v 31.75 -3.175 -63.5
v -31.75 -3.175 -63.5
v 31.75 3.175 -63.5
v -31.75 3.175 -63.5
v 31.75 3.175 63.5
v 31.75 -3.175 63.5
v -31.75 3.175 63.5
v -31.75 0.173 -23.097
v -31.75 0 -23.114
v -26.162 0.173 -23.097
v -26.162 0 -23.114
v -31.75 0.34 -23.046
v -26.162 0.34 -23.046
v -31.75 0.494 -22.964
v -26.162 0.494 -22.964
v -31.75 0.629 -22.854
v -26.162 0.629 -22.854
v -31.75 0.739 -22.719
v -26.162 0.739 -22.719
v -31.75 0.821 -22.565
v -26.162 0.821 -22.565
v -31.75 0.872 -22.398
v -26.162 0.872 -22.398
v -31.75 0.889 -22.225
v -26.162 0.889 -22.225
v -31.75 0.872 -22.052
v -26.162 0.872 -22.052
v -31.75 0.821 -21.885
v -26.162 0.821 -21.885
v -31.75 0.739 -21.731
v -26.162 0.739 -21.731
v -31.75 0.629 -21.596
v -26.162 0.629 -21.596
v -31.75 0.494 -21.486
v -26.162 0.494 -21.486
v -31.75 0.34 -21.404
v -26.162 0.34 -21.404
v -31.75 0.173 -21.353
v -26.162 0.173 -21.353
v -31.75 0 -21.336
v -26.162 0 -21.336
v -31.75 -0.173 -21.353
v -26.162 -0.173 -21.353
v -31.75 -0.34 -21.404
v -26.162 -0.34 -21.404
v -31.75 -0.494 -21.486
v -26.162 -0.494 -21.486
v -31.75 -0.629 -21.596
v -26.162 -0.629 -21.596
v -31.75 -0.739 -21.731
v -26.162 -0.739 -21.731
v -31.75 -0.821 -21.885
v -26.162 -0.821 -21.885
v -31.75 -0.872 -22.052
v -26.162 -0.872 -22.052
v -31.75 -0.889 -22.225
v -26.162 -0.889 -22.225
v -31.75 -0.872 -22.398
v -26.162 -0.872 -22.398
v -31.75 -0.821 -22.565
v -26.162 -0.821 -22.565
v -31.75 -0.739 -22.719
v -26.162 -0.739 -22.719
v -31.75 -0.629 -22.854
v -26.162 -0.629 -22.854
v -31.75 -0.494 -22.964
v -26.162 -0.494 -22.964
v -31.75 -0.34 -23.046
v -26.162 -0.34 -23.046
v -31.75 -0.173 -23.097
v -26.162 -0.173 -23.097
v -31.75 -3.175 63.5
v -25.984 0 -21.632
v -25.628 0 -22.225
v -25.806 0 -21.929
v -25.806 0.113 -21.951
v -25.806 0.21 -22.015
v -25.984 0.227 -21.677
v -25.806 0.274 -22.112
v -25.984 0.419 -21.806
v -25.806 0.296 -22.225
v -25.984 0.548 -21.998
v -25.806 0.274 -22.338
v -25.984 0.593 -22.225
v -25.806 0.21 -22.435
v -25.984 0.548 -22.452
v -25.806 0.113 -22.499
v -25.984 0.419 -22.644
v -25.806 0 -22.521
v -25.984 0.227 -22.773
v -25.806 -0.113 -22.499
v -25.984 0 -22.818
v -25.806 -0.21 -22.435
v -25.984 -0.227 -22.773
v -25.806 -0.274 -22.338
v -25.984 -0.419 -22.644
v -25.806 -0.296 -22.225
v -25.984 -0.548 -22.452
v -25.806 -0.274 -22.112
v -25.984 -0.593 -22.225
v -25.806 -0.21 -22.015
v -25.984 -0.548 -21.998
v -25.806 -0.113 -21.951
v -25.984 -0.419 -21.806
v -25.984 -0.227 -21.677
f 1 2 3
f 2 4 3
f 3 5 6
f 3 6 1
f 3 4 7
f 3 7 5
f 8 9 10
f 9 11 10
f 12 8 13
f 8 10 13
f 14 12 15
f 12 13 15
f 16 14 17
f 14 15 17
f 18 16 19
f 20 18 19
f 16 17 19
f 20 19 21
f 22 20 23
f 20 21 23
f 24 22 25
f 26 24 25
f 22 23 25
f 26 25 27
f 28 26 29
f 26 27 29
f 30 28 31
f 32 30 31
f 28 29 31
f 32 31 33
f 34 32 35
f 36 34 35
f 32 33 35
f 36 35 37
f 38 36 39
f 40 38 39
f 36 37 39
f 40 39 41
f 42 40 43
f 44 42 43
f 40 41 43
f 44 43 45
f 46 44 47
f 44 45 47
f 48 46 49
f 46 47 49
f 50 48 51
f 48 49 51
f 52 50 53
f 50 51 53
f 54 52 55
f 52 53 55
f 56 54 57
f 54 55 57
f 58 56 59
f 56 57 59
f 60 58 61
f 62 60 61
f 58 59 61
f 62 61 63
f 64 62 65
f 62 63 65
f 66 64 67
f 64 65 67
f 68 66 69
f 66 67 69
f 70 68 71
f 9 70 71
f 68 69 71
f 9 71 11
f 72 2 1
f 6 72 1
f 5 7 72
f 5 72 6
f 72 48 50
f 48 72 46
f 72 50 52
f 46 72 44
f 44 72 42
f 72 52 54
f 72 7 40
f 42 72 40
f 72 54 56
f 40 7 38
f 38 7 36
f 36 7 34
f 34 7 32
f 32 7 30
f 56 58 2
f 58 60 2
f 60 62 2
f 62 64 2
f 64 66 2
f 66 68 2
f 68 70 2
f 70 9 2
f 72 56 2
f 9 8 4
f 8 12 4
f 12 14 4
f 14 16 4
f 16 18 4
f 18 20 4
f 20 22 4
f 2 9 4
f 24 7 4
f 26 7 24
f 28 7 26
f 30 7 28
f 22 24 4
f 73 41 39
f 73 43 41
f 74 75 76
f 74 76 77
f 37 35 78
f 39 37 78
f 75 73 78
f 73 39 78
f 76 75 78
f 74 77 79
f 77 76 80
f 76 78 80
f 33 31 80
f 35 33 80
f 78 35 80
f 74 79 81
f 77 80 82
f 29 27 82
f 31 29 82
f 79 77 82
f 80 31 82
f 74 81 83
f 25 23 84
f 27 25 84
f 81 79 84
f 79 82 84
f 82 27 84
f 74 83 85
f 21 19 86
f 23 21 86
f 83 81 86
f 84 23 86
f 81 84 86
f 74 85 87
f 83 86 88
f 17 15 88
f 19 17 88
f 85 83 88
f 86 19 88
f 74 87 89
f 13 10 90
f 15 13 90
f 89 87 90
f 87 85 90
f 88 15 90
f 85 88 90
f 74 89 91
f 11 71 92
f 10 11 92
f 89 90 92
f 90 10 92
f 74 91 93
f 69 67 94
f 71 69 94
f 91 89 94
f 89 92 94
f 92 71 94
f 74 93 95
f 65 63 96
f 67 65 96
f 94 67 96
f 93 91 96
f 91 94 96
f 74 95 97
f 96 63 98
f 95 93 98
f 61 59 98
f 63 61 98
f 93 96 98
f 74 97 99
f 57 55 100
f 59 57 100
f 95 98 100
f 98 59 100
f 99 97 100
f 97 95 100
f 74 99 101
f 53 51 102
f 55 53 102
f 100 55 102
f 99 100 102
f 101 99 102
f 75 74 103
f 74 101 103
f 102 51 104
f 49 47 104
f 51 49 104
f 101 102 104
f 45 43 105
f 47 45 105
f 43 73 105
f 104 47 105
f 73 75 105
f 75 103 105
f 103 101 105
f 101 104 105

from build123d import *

# Parameters (mm, degrees)
SKETCH1_W                 = 63.5
SKETCH1_H                 = 127
BOSS_EXTRUDE1_DEPTH       = 3.175
F_2_56_TAPPED_HOLE1_D     = 1.778
F_2_56_TAPPED_HOLE1_DEPTH = 5.588
F_2_56_TAPPED_HOLE1_TIP   = 0.53416509


with BuildPart() as part:
    # Sketch1 → Boss-Extrude1 (new body, symmetric)
    with BuildSketch(Plane(origin=(0, 0, 0), x_dir=(1, 0, 0), z_dir=(0, 1, 0))):
        Rectangle(SKETCH1_W, SKETCH1_H)
    extrude(amount=BOSS_EXTRUDE1_DEPTH, both=True)

    # #2-56 Tapped Hole1
    with Locations(Plane.ZY.offset(31.75)):
        with Locations((-22.225, 0)):
            Hole(F_2_56_TAPPED_HOLE1_D / 2, depth=F_2_56_TAPPED_HOLE1_DEPTH)
            with Locations((0, 0, -(F_2_56_TAPPED_HOLE1_DEPTH + F_2_56_TAPPED_HOLE1_TIP / 2))):  # 118° drill point
                Cone(0, F_2_56_TAPPED_HOLE1_D / 2, F_2_56_TAPPED_HOLE1_TIP, mode=Mode.SUBTRACT)


solid = part.part
